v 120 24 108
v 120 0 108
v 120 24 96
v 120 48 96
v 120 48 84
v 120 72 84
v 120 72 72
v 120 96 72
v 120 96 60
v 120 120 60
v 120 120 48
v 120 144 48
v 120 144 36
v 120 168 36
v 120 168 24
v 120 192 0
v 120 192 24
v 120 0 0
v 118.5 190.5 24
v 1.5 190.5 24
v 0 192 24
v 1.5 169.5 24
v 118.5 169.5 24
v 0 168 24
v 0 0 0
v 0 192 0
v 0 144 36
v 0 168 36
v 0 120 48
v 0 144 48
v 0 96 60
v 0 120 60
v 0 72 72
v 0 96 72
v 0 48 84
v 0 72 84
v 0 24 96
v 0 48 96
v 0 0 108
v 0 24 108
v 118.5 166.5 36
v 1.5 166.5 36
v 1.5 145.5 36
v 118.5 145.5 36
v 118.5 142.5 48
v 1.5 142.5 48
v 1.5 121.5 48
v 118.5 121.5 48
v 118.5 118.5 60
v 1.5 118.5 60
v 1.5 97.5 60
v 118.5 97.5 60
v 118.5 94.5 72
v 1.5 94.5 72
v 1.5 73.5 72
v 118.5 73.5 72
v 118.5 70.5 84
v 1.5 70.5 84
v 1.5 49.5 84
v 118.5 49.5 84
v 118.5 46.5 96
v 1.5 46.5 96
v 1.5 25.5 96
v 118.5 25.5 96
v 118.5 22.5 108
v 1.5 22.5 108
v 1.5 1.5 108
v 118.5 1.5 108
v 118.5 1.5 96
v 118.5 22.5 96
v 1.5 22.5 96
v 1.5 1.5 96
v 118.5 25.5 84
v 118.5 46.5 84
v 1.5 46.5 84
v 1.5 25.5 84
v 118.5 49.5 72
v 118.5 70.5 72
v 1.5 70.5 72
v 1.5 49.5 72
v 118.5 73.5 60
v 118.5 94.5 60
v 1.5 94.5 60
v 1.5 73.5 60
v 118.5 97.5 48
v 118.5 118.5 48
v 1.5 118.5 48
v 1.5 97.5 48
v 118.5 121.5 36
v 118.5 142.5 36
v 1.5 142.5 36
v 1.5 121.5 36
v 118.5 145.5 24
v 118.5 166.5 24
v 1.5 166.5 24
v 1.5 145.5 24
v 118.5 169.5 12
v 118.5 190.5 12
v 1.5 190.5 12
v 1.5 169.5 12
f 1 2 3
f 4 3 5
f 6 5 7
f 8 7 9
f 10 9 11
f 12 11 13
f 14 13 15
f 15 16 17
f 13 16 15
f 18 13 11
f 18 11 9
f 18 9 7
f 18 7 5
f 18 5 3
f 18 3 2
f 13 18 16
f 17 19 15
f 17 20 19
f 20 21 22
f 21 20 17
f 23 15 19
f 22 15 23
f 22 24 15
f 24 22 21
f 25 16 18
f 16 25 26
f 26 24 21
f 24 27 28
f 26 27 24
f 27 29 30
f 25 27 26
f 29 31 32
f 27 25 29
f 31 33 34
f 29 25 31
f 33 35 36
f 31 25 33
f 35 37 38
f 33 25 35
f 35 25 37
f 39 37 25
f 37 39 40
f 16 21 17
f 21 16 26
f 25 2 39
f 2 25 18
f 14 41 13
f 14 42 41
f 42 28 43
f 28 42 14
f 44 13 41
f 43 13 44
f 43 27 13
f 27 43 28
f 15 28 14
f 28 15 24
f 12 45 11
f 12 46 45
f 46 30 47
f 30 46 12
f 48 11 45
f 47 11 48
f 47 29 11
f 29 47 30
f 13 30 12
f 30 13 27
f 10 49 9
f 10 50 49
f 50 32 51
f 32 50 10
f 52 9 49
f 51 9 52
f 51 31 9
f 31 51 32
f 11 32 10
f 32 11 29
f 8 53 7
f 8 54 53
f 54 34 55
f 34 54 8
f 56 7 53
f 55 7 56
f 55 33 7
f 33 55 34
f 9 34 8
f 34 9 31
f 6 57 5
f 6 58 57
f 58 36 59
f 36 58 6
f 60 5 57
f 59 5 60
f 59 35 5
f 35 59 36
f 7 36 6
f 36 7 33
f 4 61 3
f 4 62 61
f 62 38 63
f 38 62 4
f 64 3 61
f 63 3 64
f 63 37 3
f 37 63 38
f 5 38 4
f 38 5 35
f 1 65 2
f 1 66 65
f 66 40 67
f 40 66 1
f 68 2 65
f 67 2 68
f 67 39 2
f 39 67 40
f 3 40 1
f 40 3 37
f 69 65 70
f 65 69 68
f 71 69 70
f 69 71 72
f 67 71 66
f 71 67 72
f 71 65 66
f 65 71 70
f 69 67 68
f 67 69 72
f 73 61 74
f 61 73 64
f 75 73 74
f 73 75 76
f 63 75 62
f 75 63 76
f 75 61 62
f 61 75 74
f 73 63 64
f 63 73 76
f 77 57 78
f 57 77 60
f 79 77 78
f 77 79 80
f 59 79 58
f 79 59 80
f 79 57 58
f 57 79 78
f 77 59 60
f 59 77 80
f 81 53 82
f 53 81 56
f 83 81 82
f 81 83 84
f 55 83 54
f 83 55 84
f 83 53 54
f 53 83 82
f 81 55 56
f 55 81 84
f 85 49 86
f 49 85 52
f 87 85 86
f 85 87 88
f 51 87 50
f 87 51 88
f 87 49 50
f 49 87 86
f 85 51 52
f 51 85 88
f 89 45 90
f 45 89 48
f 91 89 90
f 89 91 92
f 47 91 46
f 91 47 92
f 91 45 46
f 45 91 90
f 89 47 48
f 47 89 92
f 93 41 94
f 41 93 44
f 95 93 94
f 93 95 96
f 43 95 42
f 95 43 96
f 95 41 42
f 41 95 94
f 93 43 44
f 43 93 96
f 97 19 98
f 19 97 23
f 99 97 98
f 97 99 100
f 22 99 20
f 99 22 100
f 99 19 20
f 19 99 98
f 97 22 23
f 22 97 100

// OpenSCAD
// width of the cartridge
cartridgeX = 117;
// depth of the cartidge
cartridgeY = 21;
// how much of the cartridge will sit in the holder
holderDepth = 18;
// thickness of the walls between each game
wallWidth = 3;
// how many cartridges that you want to fit in the holder
numCartridges = 8;


module cartridge() {
	cube([cartridgeX,cartridgeY,holderDepth]);
}
module stadium(levels, width, stairsize) {
	for ( l = [0 : levels]) {
		translate([0,0,l*(stairsize/2)])
		cube([width, (levels*stairsize)-(l*stairsize), stairsize]);
	}

}
module hullcart(levels, width, stairsize) {
	for( l = [0: levels]) {
		translate([
			(width-cartridgeX)/2,
			(l*stairsize)+((stairsize-cartridgeY)/2),
			((levels-l)*stairsize/2)])
		cartridge();
	}
}

module cartridgeHolder(){
	difference() {
		stadium(numCartridges, cartridgeX + wallWidth, cartridgeY + wallWidth);
		hullcart(numCartridges, cartridgeX + wallWidth, cartridgeY + wallWidth);
	}
}

cartridgeHolder();
